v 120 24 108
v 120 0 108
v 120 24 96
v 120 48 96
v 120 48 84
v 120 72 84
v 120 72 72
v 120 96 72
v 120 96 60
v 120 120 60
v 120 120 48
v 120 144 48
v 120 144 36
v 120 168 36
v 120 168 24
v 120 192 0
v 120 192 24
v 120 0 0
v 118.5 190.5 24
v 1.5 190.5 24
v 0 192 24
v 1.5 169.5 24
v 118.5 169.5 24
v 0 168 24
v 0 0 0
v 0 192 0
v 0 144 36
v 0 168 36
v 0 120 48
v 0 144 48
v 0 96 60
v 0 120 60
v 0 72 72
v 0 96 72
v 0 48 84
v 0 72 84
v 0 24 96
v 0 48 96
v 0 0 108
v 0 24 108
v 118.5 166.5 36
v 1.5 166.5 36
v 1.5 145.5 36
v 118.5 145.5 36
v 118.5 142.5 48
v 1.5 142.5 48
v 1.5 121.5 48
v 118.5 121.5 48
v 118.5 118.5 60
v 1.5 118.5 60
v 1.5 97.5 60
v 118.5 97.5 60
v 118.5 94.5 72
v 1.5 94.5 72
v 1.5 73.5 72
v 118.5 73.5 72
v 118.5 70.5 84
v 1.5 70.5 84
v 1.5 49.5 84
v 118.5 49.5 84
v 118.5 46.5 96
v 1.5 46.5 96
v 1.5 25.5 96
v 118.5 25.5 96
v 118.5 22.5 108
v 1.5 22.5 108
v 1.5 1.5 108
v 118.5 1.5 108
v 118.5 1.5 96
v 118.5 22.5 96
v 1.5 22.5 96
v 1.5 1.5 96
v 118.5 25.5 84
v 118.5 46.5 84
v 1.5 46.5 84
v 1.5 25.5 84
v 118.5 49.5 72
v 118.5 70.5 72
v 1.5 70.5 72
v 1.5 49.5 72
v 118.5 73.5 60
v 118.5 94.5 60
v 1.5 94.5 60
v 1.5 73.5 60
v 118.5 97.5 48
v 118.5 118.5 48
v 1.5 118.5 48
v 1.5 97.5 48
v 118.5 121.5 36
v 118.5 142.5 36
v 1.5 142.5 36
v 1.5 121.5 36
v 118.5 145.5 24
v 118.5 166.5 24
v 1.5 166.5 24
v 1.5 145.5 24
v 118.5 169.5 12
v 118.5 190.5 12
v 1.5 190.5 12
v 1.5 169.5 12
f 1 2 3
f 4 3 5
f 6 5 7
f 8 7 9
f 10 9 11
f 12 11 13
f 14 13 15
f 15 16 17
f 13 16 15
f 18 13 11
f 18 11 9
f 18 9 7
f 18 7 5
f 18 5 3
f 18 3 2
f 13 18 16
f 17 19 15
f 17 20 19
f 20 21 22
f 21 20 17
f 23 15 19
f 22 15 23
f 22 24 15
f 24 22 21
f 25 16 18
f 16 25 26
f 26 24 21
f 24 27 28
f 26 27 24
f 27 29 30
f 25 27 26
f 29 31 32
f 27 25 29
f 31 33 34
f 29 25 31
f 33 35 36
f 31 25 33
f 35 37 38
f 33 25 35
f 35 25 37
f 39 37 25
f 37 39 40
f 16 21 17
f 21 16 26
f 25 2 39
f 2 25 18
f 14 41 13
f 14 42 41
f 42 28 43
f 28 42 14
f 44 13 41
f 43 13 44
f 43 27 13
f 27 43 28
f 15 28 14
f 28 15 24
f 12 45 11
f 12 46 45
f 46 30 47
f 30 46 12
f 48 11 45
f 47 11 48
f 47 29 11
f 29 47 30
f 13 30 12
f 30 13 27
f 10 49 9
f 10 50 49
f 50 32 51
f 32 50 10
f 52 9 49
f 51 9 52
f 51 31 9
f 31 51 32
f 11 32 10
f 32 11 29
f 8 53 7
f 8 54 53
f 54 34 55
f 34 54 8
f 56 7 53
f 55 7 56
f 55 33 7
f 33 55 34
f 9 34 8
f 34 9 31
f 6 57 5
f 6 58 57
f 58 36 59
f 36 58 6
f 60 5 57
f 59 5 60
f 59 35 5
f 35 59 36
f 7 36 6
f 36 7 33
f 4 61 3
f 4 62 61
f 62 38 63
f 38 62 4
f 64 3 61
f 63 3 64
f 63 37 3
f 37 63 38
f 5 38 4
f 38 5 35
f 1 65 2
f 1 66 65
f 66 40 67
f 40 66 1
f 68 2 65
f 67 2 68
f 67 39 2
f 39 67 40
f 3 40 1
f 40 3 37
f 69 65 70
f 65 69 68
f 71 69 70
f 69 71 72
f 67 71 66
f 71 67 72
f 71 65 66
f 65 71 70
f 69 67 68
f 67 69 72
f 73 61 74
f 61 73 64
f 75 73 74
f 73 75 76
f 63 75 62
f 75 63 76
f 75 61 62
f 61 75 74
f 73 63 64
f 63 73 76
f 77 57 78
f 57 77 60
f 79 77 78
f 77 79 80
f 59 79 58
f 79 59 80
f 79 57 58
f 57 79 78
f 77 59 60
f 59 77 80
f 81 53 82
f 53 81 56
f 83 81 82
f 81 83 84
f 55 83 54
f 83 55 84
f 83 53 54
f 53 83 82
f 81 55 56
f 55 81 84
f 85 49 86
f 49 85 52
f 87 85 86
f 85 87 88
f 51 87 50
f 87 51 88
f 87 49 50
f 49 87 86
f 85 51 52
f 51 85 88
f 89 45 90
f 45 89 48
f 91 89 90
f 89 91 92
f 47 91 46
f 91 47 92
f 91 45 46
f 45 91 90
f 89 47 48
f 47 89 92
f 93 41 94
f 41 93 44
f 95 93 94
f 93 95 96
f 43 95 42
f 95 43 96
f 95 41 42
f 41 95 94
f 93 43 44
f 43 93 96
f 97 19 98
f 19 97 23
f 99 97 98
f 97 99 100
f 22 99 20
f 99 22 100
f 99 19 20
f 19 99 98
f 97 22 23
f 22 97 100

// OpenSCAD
// width of the cartridge
cartridgeX = 117;
// depth of the cartidge
cartridgeY = 21;
// how much of the cartridge will sit in the holder
holderDepth = 18;
// thickness of the walls between each game
wallWidth = 3;
// how many cartridges that you want to fit in the holder
numCartridges = 8;


module cartridge() {
	cube([cartridgeX,cartridgeY,holderDepth]);
}
module stadium(levels, width, stairsize) {
	for ( l = [0 : levels]) {
		translate([0,0,l*(stairsize/2)])
		cube([width, (levels*stairsize)-(l*stairsize), stairsize]);
	}

}
module hullcart(levels, width, stairsize) {
	for( l = [0: levels]) {
		translate([
			(width-cartridgeX)/2,
			(l*stairsize)+((stairsize-cartridgeY)/2),
			((levels-l)*stairsize/2)])
		cartridge();
	}
}

module cartridgeHolder(){
	difference() {
		stadium(numCartridges, cartridgeX + wallWidth, cartridgeY + wallWidth);
		hullcart(numCartridges, cartridgeX + wallWidth, cartridgeY + wallWidth);
	}
}

cartridgeHolder();
